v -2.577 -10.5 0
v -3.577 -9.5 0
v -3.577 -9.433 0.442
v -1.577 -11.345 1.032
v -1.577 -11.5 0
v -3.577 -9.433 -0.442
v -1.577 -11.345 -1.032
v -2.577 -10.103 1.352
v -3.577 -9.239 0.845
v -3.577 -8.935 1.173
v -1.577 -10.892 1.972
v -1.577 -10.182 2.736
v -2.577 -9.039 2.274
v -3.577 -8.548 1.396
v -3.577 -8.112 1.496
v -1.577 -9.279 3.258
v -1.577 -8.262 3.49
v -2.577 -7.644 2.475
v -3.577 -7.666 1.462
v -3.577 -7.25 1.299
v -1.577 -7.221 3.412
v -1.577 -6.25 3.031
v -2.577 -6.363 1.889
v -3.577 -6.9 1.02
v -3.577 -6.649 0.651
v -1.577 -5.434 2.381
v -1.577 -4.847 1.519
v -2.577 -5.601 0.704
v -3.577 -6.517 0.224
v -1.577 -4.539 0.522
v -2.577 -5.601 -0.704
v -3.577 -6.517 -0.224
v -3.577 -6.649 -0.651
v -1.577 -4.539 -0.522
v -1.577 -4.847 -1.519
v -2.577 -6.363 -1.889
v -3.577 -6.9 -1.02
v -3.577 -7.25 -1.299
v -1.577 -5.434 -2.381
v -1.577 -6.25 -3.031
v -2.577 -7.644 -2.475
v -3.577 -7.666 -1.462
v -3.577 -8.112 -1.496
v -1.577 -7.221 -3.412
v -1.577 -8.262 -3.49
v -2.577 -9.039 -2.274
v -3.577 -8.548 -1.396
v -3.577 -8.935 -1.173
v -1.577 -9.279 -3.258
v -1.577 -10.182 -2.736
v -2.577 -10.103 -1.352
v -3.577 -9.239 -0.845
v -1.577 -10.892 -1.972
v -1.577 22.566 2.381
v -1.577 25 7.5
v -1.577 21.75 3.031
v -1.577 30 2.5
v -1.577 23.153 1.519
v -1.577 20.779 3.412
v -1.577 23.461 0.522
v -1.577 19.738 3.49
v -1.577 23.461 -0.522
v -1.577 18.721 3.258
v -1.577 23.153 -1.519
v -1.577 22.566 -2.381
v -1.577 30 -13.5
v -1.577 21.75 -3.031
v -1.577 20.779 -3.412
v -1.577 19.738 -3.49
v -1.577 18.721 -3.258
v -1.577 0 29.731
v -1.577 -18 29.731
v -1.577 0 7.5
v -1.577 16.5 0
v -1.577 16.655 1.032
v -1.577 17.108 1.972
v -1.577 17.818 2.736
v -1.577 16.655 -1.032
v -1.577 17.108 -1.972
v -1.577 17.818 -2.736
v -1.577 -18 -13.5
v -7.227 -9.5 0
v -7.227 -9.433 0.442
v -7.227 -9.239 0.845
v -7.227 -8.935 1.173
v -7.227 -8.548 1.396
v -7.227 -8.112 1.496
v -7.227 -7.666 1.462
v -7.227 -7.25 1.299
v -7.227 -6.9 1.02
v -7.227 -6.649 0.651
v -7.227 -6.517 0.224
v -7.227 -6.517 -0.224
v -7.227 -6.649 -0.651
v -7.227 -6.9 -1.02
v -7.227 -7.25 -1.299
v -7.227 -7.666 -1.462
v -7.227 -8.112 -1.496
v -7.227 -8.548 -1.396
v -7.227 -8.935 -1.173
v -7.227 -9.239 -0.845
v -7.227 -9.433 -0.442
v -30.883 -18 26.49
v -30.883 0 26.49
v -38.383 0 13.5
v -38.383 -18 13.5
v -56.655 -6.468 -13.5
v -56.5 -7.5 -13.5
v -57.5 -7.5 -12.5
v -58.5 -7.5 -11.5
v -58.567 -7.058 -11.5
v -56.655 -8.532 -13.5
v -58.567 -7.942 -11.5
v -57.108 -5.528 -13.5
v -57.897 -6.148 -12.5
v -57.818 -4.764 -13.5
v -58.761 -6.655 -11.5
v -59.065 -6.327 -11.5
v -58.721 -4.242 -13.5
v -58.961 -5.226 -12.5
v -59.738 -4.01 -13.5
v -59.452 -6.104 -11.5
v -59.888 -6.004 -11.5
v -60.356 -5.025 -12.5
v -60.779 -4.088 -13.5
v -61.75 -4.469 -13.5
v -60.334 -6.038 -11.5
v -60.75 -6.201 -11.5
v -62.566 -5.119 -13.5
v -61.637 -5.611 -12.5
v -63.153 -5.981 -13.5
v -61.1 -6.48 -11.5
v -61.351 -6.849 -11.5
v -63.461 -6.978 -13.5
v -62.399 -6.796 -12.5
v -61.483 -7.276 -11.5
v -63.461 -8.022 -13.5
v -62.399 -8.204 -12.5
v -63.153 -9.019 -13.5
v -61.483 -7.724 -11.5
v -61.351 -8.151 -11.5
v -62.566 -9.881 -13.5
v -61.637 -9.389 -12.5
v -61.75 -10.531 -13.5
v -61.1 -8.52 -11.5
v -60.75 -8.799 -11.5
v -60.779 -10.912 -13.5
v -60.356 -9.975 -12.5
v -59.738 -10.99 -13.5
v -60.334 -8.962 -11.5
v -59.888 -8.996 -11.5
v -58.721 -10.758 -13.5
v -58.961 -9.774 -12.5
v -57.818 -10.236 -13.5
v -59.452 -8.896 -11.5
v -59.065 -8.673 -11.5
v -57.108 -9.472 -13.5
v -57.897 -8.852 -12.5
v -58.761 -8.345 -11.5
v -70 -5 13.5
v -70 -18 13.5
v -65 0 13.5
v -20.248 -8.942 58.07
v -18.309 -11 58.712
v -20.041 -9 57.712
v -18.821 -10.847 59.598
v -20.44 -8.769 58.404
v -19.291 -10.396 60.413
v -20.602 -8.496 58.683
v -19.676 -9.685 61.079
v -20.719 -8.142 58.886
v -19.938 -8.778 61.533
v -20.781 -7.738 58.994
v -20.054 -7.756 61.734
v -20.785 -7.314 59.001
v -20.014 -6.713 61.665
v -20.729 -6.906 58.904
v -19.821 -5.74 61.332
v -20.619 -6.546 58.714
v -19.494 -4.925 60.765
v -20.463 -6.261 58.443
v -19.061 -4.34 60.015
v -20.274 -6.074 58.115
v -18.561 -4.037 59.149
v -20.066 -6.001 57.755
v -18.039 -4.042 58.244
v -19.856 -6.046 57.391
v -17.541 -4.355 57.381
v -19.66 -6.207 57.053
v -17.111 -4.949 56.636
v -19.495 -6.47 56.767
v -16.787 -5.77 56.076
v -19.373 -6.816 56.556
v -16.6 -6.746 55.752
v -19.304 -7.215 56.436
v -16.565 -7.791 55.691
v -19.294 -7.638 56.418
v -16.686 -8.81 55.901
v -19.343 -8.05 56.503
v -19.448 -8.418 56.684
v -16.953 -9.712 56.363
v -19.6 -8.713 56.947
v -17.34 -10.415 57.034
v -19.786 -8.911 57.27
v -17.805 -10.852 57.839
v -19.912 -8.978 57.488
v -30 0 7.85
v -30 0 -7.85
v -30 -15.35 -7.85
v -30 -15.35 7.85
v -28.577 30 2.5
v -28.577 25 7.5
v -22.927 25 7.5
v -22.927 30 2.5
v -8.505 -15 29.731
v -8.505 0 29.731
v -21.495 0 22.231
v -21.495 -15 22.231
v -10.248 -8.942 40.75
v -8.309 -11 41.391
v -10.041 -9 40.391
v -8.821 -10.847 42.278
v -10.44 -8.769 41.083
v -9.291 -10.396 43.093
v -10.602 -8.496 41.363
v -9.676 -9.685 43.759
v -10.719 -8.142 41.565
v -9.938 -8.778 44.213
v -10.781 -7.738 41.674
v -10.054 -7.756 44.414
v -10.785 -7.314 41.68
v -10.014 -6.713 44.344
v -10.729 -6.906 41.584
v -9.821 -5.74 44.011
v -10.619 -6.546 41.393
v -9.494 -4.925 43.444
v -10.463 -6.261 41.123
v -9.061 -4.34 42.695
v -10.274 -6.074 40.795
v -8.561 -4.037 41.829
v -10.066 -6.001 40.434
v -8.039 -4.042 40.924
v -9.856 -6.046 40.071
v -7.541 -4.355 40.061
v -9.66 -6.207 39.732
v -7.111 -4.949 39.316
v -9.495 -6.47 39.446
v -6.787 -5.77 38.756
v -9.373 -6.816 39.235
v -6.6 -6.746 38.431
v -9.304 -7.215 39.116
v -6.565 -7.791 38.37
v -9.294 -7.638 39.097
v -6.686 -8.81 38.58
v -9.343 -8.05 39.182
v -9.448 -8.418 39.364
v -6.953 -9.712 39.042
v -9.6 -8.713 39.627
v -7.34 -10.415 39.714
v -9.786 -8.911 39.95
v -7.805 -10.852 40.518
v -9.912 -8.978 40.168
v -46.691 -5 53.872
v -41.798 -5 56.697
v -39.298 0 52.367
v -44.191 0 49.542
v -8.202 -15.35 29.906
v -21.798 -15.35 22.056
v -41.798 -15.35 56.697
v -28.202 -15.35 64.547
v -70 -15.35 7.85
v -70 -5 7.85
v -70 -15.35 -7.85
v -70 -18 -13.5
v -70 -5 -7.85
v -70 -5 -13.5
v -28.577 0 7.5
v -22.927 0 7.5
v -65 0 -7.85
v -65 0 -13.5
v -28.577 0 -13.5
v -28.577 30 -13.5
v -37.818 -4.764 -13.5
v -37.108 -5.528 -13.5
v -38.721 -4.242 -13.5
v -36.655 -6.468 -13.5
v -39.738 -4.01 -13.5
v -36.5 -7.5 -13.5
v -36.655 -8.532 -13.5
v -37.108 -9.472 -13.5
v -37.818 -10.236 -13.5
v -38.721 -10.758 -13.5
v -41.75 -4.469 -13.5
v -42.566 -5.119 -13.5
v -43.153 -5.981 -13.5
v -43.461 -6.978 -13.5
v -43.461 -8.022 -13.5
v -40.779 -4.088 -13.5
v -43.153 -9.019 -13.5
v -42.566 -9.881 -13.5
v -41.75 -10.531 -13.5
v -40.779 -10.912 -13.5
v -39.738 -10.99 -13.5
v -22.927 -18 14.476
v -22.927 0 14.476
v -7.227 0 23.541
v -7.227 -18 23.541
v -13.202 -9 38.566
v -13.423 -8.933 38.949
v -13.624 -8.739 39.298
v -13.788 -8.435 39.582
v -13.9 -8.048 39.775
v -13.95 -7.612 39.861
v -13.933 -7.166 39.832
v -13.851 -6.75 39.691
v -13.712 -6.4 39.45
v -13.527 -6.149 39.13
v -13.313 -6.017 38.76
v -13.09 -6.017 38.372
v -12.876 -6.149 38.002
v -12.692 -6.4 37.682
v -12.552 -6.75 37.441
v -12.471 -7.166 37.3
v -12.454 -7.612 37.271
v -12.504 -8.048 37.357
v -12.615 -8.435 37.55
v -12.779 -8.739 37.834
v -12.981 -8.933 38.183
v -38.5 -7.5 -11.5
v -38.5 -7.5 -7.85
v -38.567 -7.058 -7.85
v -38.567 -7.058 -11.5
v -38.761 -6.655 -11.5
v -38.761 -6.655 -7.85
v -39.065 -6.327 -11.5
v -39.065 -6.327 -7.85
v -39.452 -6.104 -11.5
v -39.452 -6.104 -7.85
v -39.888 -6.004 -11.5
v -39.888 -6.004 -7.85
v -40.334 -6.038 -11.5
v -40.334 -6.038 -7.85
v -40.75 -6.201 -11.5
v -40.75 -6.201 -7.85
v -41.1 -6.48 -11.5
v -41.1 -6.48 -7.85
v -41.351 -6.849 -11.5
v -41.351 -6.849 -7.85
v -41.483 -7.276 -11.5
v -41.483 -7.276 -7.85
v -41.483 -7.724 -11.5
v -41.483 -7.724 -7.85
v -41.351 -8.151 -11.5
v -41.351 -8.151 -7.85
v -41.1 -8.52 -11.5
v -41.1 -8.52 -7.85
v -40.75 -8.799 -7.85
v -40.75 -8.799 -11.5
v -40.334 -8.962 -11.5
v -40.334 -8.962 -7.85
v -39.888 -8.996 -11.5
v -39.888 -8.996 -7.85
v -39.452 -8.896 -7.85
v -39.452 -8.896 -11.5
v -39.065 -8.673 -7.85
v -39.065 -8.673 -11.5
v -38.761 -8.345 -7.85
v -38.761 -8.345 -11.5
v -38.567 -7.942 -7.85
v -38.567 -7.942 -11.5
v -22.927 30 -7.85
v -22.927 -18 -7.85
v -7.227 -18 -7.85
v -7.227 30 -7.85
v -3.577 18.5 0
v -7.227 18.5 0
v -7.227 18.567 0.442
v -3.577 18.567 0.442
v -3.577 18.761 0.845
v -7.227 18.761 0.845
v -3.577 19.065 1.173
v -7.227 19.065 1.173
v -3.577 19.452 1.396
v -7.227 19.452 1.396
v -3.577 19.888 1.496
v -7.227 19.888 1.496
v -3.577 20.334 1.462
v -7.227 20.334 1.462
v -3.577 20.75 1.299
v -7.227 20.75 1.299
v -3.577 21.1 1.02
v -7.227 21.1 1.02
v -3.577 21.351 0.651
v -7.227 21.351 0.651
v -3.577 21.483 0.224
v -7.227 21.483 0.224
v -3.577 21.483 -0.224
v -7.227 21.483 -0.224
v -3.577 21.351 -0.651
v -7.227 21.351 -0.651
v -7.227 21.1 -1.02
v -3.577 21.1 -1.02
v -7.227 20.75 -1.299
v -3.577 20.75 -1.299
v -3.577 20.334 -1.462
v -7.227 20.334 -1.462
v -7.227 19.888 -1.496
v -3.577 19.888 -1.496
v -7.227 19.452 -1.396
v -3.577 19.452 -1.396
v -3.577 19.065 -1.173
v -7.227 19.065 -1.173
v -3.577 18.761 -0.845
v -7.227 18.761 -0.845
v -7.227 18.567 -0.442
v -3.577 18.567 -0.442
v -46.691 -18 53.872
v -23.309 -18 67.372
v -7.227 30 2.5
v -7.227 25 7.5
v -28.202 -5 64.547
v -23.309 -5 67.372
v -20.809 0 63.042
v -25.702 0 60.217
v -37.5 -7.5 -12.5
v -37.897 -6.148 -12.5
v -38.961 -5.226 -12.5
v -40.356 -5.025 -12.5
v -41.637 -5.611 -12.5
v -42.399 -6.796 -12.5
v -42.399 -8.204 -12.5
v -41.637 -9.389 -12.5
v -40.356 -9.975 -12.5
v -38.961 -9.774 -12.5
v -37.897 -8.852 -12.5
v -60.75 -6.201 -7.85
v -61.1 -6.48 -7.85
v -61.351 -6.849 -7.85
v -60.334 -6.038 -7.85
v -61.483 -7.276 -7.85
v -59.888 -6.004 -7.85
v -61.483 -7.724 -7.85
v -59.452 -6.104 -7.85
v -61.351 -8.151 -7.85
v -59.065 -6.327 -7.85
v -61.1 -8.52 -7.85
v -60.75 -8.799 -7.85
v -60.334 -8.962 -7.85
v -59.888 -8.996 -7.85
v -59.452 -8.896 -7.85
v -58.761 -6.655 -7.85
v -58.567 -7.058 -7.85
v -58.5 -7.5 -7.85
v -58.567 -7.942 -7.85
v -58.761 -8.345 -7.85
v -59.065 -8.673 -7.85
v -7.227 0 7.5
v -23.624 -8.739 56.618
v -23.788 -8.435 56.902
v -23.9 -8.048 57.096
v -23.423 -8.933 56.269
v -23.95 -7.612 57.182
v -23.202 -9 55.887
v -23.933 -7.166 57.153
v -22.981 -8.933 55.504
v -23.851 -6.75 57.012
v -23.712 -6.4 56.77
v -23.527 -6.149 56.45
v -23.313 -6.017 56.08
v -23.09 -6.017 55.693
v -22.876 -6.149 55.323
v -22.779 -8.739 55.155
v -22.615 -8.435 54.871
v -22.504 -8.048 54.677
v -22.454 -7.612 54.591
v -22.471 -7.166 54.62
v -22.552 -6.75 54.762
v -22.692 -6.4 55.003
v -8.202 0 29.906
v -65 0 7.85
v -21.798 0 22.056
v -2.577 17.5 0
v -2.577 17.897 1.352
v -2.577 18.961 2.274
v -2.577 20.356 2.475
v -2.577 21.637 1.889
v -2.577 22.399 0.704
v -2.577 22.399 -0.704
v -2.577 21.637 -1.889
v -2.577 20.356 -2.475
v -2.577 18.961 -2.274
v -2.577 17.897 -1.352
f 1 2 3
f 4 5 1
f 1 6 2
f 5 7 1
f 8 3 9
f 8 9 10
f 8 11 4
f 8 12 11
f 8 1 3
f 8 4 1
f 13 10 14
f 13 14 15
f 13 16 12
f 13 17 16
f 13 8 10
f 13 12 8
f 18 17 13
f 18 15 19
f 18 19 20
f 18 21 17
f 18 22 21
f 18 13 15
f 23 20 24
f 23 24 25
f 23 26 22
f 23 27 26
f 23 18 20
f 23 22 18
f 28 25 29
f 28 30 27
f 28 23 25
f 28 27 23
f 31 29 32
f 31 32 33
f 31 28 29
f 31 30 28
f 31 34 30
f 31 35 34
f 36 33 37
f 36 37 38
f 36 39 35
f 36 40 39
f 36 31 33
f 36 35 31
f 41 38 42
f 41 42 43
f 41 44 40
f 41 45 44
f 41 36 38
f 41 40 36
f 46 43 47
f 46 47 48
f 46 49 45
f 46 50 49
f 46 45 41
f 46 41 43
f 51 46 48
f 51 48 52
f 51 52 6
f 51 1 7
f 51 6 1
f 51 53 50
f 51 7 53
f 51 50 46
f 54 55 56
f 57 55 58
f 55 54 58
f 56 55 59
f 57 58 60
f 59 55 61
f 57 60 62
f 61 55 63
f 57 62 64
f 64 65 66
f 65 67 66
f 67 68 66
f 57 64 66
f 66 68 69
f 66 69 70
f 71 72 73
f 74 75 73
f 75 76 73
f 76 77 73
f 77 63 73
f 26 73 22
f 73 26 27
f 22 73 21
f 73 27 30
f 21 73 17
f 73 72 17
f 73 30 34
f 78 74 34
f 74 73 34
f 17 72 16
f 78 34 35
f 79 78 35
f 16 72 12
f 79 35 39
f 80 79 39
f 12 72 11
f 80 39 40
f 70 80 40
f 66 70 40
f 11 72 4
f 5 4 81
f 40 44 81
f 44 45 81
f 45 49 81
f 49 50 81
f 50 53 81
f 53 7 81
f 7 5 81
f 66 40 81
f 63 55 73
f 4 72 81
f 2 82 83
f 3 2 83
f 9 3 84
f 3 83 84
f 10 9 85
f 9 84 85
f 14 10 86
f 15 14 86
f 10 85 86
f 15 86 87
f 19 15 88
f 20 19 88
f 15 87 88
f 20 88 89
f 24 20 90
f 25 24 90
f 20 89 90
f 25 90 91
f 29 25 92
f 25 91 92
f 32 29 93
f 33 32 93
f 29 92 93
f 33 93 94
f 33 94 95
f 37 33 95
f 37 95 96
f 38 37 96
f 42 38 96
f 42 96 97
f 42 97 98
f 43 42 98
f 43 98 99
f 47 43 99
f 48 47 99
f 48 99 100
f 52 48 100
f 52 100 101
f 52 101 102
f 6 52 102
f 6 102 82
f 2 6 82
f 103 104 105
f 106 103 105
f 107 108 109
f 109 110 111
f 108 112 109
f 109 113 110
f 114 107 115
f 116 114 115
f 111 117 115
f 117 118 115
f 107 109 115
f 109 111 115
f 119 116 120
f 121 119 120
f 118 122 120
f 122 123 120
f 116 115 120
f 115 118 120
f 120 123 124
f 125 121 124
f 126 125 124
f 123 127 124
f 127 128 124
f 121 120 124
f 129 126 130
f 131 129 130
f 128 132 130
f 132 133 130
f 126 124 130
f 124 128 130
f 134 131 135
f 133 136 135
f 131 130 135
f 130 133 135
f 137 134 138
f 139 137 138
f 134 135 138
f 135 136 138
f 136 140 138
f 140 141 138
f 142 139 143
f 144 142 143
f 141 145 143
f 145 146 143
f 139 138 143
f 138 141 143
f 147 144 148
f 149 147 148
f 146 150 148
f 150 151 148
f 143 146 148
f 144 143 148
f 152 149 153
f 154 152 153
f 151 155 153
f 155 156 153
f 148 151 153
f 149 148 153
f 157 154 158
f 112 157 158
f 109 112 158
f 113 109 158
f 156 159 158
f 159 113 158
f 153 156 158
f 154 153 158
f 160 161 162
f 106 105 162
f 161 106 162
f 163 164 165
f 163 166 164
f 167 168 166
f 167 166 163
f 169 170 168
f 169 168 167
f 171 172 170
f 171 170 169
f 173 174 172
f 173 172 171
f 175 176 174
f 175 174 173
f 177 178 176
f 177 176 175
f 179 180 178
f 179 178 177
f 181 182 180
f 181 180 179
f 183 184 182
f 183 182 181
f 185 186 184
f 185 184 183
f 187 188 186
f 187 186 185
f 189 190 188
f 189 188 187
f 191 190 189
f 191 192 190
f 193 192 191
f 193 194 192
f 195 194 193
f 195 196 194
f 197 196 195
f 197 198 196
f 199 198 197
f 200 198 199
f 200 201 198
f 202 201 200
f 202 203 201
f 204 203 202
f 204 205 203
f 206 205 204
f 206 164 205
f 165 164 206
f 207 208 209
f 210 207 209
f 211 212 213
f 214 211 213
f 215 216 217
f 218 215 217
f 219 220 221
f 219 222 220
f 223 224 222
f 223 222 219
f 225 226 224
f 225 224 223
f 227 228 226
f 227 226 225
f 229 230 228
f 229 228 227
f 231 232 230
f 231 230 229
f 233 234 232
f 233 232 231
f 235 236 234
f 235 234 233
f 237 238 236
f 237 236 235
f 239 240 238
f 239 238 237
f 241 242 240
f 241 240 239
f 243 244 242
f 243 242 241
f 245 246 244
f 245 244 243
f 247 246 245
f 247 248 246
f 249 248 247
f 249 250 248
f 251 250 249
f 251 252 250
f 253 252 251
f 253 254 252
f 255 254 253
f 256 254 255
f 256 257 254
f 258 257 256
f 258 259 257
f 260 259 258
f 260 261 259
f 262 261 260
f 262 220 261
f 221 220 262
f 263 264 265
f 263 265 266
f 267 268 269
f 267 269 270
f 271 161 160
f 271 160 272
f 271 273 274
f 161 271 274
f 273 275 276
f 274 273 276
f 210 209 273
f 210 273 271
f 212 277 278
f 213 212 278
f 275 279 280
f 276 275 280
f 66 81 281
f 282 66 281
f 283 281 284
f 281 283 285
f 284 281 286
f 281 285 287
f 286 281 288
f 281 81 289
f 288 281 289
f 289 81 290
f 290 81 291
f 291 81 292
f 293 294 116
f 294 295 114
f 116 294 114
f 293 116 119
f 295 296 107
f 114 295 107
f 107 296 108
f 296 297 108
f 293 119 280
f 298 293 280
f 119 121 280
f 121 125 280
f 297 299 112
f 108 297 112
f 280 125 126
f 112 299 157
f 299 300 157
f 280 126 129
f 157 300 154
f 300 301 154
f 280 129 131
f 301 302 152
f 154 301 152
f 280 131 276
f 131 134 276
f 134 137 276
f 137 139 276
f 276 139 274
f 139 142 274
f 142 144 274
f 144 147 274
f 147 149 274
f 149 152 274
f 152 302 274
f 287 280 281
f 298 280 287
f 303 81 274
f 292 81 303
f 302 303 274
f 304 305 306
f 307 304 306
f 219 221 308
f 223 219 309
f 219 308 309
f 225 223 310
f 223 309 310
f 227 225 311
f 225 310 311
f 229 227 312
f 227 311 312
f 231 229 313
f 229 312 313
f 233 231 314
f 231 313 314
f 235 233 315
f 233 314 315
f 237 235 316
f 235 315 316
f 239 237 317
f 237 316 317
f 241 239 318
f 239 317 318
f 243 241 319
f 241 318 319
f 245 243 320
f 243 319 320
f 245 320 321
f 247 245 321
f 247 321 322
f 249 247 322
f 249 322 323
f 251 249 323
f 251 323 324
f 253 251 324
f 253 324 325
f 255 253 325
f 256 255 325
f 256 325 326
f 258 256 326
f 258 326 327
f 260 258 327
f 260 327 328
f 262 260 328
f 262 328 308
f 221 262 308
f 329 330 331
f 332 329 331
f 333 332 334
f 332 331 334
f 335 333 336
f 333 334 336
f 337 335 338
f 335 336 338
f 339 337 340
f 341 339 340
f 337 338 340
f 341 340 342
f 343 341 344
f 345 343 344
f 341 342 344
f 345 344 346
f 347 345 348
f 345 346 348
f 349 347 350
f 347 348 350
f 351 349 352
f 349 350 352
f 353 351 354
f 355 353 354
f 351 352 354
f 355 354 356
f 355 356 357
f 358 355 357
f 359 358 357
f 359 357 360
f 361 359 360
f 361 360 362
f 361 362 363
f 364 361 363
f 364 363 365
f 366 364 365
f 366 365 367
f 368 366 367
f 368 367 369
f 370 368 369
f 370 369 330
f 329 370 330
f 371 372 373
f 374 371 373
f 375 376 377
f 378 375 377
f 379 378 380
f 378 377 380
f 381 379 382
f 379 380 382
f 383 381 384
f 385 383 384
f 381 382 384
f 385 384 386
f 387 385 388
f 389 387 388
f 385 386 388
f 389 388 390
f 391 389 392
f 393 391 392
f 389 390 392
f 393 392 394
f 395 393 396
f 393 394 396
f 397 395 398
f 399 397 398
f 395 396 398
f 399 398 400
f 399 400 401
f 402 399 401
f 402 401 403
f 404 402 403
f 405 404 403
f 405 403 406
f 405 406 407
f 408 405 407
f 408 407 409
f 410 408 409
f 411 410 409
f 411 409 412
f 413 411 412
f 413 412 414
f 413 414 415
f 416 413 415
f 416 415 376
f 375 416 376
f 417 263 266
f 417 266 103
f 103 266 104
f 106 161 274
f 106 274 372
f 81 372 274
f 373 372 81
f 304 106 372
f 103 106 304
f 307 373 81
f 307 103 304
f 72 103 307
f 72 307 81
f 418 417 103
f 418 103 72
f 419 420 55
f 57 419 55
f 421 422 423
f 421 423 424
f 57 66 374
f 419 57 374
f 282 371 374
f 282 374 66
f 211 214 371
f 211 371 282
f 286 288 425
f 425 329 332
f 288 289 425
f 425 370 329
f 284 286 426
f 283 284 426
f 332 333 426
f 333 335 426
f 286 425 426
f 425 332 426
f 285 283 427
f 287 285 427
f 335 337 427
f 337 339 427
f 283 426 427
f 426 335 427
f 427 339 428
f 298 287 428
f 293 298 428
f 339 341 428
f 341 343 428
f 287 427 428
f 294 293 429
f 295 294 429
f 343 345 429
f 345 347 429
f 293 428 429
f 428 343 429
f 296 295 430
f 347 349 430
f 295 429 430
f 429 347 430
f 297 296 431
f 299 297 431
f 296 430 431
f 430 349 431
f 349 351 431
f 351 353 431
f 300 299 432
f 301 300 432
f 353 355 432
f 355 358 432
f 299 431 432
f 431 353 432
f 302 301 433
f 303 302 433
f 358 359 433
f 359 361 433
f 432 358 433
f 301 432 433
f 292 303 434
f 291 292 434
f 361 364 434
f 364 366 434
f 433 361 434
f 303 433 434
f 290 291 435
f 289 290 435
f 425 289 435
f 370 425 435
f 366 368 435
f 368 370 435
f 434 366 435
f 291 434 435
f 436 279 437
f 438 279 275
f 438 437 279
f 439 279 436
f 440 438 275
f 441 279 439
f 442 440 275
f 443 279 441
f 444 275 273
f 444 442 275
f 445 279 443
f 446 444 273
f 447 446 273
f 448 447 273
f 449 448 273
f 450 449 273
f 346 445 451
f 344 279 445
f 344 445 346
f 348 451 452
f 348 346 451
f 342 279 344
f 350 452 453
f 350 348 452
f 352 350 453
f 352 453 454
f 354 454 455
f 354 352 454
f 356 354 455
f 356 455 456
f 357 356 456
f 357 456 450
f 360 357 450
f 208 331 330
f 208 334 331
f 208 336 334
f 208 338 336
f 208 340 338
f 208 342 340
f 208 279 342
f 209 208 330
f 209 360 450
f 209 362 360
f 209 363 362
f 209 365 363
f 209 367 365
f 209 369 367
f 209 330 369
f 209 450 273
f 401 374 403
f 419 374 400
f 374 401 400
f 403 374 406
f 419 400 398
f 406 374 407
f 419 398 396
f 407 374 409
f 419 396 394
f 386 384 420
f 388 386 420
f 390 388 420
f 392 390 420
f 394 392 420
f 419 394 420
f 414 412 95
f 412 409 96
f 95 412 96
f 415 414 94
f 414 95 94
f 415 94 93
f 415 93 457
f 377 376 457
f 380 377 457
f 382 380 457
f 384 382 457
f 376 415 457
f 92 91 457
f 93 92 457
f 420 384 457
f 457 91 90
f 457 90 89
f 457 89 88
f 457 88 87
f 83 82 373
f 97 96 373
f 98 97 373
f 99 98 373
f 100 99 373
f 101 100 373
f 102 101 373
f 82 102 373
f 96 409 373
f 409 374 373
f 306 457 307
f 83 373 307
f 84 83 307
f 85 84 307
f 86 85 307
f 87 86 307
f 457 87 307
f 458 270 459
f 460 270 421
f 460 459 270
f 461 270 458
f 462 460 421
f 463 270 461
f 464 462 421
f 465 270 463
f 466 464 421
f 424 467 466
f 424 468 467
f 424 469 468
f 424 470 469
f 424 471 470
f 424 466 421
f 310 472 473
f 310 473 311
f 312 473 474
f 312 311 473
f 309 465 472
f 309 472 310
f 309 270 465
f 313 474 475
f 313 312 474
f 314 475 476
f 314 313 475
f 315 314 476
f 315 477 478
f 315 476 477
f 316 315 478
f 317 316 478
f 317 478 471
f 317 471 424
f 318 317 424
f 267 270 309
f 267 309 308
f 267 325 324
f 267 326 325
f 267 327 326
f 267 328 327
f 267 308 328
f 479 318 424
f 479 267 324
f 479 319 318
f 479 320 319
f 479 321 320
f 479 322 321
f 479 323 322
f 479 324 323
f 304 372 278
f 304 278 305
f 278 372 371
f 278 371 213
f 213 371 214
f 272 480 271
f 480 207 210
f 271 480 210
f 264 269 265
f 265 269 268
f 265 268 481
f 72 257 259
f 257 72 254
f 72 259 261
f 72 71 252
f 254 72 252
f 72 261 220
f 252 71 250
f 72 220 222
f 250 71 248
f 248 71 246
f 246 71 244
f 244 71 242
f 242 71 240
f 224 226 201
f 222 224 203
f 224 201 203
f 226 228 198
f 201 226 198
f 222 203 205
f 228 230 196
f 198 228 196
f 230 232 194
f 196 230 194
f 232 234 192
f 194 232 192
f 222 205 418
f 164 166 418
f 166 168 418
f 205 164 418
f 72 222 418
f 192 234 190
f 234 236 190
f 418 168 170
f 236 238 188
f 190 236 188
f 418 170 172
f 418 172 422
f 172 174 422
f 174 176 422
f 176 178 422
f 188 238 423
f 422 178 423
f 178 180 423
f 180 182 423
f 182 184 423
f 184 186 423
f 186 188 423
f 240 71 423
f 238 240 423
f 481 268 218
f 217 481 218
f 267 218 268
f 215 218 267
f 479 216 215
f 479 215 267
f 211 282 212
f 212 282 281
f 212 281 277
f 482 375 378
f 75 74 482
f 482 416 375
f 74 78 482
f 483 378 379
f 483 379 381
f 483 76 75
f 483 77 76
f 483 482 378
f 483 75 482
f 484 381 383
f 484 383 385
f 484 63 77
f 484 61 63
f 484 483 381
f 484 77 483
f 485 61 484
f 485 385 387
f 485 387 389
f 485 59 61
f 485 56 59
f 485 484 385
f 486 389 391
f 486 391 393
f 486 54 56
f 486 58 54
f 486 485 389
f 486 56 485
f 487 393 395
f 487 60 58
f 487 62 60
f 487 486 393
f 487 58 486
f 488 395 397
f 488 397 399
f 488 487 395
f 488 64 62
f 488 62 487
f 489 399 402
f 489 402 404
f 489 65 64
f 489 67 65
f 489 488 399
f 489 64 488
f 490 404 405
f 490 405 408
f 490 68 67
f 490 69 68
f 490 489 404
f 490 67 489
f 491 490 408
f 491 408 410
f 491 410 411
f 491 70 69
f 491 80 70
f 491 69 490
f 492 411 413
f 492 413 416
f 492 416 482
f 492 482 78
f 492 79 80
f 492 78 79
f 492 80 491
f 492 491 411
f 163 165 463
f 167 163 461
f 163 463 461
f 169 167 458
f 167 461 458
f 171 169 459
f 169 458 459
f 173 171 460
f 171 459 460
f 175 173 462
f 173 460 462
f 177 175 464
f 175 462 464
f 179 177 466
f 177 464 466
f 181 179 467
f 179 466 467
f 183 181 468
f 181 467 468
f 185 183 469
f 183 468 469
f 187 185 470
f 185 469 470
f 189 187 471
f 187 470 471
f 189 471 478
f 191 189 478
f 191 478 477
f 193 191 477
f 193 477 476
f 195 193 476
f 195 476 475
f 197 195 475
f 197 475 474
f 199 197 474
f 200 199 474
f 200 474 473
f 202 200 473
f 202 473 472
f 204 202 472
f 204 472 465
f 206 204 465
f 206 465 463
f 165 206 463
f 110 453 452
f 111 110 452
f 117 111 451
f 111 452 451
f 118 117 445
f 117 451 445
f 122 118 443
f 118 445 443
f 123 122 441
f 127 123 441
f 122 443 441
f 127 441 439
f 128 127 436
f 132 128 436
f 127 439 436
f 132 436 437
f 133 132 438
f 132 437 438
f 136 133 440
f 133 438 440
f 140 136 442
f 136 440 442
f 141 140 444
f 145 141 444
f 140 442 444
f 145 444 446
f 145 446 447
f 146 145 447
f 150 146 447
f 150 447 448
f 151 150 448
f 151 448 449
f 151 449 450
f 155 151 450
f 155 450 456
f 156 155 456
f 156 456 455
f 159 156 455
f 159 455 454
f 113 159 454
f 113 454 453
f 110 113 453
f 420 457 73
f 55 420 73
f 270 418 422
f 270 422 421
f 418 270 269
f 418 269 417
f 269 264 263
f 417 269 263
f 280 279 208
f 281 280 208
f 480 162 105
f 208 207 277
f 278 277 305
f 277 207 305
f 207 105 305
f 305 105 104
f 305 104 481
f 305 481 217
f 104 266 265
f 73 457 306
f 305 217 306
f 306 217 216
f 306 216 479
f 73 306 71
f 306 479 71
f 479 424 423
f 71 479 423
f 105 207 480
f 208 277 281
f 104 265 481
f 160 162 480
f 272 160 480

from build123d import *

# Parameters (mm, degrees)
F0_W      = 15
F0_H      = 15
F1_DEPTH  = 15
F2_W      = 15
F2_H      = 15
F3_DEPTH  = 3
F5_DEPTH  = 30
F6_R      = 1.5
F7_DEPTH  = 6.001
F8_R      = 1.5
F9_DEPTH  = 24.8215080757
F10_R     = 1.5
F11_DEPTH = 6.001
F12_SIZE  = 5
F13_SIZE  = 2
F14_W     = 15.7
F14_H     = 15.7
F15_DEPTH = 48.001
F16_W     = 15.7
F16_H     = 15.7
F17_DEPTH = 63.3466714755
F18_W     = 15.7
F18_H     = 15.7
F19_DEPTH = 40.001
F21_DEPTH = 18.001


with BuildPart() as f1:
    # F0 (on Front) → F1 (new body)
    with BuildSketch(Plane.XZ):
        Polygon((-70, 7.5), (-30, 7.5), (-30, -7.5), (-70, -7.5), (-70, -13.5), (-1.5766062413, -13.5), (-1.5766062413, 29.7307621135), (-23.3086570489, 67.3717782649), (-28.5048094716, 64.3717782649), (-8.5048094716, 29.7307621135), (-21.4951905284, 22.2307621135), (-41.4951905284, 56.8717782649), (-46.6913429511, 53.8717782649), (-30.8826859022, 26.4903810568), (-38.3826859022, 13.5), (-70, 13.5), align=None)
        with Locations((-15.0766062413, 0)):
            Rectangle(F0_W, F0_H, mode=Mode.SUBTRACT)
    extrude(amount=F1_DEPTH)

    # F2 (on face) → F3 (join)
    with BuildSketch(Plane.XZ.offset(15)):
        Polygon((-38.3826859022, 13.5), (-70, 13.5), (-70, -13.5), (-1.5766062413, -13.5), (-1.5766062413, 29.7307621135), (-23.3086570489, 67.3717782649), (-46.6913429511, 53.8717782649), (-30.8826859022, 26.4903810568), align=None)
        with Locations((-15.0766062413, 0)):
            Rectangle(F2_W, F2_H, mode=Mode.SUBTRACT)
    extrude(amount=F3_DEPTH)

    # F4 (on face) → F5 (join)
    with BuildSketch(Plane(origin=(0, 0, 0), x_dir=(-1, 0, 0), z_dir=(0, 1, 0))):
        Polygon((7.5766062413, -7.5), (7.5766062413, 7.5), (1.5766062413, 7.5), (1.5766062413, -13.5), (28.5766062413, -13.5), (28.5766062413, 7.5), (22.5766062413, 7.5), (22.5766062413, -7.5), align=None)
    extrude(amount=F5_DEPTH)

    # F6 (on face) → F7 (cut, through all)
    with BuildSketch(Plane.XY.offset(-7.5)):
        with Locations((-40, -7.5)):
            Circle(F6_R)
        with Locations((-60, -7.5)):
            Circle(F6_R)
    extrude(amount=-F7_DEPTH, mode=Mode.SUBTRACT)

    # F8 (on face) → F9 (cut, through all)
    with BuildSketch(Plane(origin=(6.4951905284, 0, 3.75), x_dir=(0, -1, 0), z_dir=(-0.8660254038, 0, -0.5))):
        with Locations((7.5, 40)):
            Circle(F8_R)
        with Locations((7.5, 60)):
            Circle(F8_R)
    extrude(amount=-F9_DEPTH, mode=Mode.SUBTRACT)

    # F10 (on face) → F11 (cut, through all)
    with BuildSketch(Plane(origin=(-7.5766062413, 0, 0), x_dir=(0, -1, 0), z_dir=(-1, 0, 0))):
        with Locations((-20, 0)):
            Circle(F10_R)
        with Locations((8, 0)):
            Circle(F10_R)
    extrude(amount=-F11_DEPTH, mode=Mode.SUBTRACT)

    # F12
    f12_edges = [f1.edges().sort_by_distance(p)[0] for p in [
        (-25.906733, 0, 65.871778),
        (-44.093267, 0, 55.371778),
        (-4.576606, 30, 7.5),
        (-25.576606, 30, 7.5),
        (-70, 0, 10.5),
        (-70, 0, -10.5),
    ]]
    chamfer(f12_edges, length=F12_SIZE)

    # F13
    f13_edges = [f1.edges().sort_by_distance(p)[0] for p in [
        (-1.576606, -6.5, 0),
        (-1.576606, 21.5, 0),
        (-8.308657, -6, 41.391016),
        (-18.308657, -6, 58.711524),
        (-41.5, -7.5, -13.5),
        (-61.5, -7.5, -13.5),
    ]]
    chamfer(f13_edges, length=F13_SIZE)

    # F14 (on face) → F15 (cut, through all)
    with BuildSketch(Plane.XZ.offset(18)):
        with Locations((-15.0766062413, 0)):
            Rectangle(F14_W, F14_H)
    extrude(amount=-F15_DEPTH, mode=Mode.SUBTRACT)

    # F16 (on face) → F17 (cut, through all)
    with BuildSketch(Plane(origin=(-15, 0, 25.9807621135), x_dir=(0.8660254038, 0, 0.5), z_dir=(-0.5, 0, 0.8660254038))):
        with Locations((0, -7.5)):
            Rectangle(F16_W, F16_H)
    extrude(amount=F17_DEPTH, mode=Mode.SUBTRACT)

    # F18 (on face) → F19 (cut, through all)
    with BuildSketch(Plane(origin=(-30, 0, 0), x_dir=(0, -1, 0), z_dir=(-1, 0, 0))):
        with Locations((7.5, 0)):
            Rectangle(F18_W, F18_H)
    extrude(amount=F19_DEPTH, mode=Mode.SUBTRACT)

    # F20 (on face) → F21 (cut, through all)
    with BuildSketch(Plane(origin=(0, 0, 0), x_dir=(-1, 0, 0), z_dir=(0, 1, 0))):
        Polygon((7.2266062413, 23.5405298623), (7.2266062413, 7.85), (22.9266062413, 7.85), (22.9266062413, 14.4761306361), align=None)
    extrude(amount=-F21_DEPTH, mode=Mode.SUBTRACT)


solid = f1.part
